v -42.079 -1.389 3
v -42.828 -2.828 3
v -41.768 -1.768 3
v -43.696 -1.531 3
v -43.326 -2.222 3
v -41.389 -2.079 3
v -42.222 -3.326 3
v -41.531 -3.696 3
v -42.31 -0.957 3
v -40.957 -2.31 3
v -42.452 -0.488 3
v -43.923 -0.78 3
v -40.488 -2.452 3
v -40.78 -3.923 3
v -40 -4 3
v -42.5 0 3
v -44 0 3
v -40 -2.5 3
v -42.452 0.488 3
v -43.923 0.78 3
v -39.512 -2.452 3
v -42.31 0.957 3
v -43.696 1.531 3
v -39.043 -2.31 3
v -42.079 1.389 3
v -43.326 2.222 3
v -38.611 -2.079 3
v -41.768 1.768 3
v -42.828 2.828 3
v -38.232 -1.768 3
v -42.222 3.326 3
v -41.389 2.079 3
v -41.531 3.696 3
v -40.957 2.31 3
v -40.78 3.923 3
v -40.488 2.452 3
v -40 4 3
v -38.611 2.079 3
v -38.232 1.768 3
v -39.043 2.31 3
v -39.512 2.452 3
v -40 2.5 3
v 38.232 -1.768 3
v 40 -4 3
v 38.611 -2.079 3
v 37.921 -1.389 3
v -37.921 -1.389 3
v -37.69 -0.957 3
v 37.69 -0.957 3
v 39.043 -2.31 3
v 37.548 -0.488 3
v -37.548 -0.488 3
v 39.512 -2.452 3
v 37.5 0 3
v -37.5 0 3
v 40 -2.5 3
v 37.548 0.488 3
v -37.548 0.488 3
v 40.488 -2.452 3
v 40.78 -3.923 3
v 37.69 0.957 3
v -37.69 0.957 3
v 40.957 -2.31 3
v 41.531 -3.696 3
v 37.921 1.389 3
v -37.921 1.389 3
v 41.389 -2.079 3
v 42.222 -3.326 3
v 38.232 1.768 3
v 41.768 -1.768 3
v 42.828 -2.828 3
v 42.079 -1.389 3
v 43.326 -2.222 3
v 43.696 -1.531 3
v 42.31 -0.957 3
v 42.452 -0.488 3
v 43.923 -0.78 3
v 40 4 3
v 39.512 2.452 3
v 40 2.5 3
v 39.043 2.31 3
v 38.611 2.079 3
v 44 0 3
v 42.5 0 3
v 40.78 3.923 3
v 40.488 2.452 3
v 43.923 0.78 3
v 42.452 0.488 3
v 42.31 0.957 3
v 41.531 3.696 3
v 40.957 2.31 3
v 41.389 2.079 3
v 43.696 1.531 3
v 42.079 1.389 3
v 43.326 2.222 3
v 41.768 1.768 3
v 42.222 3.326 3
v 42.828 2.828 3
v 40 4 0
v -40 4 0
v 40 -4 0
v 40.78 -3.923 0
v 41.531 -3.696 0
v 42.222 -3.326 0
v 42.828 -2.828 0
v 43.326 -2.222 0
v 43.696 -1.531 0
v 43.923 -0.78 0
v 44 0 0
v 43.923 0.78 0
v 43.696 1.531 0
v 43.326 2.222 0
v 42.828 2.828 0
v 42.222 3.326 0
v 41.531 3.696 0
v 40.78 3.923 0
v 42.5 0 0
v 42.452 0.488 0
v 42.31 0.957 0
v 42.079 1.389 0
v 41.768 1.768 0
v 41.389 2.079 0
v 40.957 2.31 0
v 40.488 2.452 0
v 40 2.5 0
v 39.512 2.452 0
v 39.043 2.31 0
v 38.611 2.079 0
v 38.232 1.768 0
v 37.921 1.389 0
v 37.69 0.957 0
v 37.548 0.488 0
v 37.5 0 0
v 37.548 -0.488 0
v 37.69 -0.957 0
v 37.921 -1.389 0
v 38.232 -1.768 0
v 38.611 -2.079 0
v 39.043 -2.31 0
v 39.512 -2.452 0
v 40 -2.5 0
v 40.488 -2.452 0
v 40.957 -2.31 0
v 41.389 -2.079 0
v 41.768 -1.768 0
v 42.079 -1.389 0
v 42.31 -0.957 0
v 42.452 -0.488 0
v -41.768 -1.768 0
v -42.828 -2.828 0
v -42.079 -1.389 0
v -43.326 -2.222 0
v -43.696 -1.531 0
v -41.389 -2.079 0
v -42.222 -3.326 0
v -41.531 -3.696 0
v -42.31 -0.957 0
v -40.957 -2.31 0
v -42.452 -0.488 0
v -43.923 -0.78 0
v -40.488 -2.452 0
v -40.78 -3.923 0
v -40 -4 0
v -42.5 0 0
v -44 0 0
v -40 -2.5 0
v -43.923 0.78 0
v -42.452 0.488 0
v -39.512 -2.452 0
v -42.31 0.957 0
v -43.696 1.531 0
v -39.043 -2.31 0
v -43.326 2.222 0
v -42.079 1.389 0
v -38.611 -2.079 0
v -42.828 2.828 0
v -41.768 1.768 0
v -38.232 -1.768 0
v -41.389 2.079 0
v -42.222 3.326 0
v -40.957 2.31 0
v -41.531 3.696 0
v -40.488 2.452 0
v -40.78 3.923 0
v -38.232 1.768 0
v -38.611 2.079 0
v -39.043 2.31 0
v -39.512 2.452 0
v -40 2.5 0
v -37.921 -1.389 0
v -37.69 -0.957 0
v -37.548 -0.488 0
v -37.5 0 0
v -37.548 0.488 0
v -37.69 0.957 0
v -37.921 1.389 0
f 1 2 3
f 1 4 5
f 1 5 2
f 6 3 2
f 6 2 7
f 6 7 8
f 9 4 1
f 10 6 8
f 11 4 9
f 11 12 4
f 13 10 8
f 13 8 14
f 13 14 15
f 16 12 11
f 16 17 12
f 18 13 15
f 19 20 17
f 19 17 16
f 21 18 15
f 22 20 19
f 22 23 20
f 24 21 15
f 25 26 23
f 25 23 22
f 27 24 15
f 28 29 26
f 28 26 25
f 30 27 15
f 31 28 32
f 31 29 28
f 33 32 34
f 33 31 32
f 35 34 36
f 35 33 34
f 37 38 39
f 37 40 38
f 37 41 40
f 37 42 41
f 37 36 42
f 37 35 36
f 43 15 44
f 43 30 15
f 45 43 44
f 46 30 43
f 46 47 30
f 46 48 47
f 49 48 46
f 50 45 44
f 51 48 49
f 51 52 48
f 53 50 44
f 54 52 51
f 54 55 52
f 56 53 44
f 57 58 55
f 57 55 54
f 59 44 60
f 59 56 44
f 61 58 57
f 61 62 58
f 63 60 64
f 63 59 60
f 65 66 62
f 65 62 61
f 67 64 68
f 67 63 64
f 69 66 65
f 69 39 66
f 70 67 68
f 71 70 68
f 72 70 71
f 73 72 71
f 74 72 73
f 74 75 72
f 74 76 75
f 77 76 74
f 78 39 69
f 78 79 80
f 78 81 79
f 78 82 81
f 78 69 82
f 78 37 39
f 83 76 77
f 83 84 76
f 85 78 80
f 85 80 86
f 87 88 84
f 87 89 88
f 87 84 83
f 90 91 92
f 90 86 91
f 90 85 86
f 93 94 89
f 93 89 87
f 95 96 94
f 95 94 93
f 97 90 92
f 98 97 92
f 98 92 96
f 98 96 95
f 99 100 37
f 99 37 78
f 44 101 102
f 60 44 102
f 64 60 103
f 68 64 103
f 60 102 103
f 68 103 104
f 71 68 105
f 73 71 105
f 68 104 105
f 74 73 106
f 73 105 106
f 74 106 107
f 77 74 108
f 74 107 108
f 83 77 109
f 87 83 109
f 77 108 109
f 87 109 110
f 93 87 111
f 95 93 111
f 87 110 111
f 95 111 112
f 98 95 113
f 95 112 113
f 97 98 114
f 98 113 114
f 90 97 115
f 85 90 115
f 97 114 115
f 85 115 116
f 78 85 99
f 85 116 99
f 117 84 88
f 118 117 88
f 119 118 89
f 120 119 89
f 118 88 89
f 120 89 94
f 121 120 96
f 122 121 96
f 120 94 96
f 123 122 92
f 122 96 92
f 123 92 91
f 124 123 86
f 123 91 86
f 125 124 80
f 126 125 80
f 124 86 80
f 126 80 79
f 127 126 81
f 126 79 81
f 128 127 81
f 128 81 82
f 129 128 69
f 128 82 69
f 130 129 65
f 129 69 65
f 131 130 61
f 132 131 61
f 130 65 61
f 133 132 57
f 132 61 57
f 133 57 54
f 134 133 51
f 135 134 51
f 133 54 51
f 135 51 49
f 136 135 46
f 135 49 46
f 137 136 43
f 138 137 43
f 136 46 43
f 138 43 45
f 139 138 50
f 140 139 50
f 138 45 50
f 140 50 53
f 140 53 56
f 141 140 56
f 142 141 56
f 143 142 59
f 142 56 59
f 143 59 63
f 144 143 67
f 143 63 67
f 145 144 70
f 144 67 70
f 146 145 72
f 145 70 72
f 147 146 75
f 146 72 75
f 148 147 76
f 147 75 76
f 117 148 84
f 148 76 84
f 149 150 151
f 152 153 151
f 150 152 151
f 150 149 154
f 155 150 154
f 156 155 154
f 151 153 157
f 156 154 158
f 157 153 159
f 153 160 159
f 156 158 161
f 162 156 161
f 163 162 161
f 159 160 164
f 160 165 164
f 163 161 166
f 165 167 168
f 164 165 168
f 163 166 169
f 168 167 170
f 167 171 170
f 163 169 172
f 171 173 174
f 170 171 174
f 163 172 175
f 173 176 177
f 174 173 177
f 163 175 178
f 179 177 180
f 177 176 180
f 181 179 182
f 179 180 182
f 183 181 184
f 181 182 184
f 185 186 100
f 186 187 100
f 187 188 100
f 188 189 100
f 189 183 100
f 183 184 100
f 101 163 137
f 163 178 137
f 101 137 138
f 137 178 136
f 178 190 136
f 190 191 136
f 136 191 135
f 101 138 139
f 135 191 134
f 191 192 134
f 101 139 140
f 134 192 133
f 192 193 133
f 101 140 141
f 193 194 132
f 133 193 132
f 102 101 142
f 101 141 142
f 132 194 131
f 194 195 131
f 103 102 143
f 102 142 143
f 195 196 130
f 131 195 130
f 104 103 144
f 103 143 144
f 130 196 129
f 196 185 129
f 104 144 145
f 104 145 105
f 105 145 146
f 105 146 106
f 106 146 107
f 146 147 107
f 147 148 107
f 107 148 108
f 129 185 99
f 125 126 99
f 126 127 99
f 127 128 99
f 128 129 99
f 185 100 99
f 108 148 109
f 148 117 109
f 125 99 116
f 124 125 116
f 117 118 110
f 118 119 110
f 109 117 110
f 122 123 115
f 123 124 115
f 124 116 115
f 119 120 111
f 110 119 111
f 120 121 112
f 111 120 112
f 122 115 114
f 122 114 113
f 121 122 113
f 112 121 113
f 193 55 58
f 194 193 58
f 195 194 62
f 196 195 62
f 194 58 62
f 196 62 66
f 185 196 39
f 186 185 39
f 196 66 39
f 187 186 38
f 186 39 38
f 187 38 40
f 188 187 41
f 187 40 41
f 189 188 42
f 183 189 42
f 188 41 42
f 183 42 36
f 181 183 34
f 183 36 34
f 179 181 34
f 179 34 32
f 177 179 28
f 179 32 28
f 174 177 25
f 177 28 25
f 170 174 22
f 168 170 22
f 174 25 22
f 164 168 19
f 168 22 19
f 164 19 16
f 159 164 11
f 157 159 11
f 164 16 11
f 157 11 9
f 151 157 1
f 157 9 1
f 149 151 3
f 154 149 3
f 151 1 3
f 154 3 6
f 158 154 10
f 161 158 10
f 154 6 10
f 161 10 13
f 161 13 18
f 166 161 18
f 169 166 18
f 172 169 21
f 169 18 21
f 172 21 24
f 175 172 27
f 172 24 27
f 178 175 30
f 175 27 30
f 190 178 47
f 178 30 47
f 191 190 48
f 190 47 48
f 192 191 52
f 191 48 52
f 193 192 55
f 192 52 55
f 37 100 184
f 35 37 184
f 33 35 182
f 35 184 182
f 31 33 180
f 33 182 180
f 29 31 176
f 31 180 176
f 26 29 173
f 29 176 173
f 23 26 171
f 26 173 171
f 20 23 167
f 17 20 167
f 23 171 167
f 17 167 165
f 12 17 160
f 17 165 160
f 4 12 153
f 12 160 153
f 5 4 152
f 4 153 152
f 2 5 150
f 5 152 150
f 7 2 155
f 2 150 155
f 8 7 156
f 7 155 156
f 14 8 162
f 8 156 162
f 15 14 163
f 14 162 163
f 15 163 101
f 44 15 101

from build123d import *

# Parameters (mm, degrees)
SKETCH1_R           = 4
SKETCH1_W           = 80
SKETCH1_H           = 8
BOSS_EXTRUDE1_DEPTH = 3
SKETCH2_R           = 2.5
CUT_EXTRUDE1_DEPTH  = 3


with BuildPart() as part:
    # Sketch1 → Boss-Extrude1 (new body)
    with BuildSketch(Plane.XY):
        with Locations((-40, 0)):
            Circle(SKETCH1_R)
        with Locations((40, 0)):
            Circle(SKETCH1_R)
        Rectangle(SKETCH1_W, SKETCH1_H)
    extrude(amount=BOSS_EXTRUDE1_DEPTH)

    # Sketch2 → Cut-Extrude1 (cut)
    with BuildSketch(Plane.XY.offset(3)):
        with Locations((-40, 0)):
            Circle(SKETCH2_R)
        with Locations((40, 0)):
            Circle(SKETCH2_R)
    extrude(amount=-CUT_EXTRUDE1_DEPTH, mode=Mode.SUBTRACT)


solid = part.part
